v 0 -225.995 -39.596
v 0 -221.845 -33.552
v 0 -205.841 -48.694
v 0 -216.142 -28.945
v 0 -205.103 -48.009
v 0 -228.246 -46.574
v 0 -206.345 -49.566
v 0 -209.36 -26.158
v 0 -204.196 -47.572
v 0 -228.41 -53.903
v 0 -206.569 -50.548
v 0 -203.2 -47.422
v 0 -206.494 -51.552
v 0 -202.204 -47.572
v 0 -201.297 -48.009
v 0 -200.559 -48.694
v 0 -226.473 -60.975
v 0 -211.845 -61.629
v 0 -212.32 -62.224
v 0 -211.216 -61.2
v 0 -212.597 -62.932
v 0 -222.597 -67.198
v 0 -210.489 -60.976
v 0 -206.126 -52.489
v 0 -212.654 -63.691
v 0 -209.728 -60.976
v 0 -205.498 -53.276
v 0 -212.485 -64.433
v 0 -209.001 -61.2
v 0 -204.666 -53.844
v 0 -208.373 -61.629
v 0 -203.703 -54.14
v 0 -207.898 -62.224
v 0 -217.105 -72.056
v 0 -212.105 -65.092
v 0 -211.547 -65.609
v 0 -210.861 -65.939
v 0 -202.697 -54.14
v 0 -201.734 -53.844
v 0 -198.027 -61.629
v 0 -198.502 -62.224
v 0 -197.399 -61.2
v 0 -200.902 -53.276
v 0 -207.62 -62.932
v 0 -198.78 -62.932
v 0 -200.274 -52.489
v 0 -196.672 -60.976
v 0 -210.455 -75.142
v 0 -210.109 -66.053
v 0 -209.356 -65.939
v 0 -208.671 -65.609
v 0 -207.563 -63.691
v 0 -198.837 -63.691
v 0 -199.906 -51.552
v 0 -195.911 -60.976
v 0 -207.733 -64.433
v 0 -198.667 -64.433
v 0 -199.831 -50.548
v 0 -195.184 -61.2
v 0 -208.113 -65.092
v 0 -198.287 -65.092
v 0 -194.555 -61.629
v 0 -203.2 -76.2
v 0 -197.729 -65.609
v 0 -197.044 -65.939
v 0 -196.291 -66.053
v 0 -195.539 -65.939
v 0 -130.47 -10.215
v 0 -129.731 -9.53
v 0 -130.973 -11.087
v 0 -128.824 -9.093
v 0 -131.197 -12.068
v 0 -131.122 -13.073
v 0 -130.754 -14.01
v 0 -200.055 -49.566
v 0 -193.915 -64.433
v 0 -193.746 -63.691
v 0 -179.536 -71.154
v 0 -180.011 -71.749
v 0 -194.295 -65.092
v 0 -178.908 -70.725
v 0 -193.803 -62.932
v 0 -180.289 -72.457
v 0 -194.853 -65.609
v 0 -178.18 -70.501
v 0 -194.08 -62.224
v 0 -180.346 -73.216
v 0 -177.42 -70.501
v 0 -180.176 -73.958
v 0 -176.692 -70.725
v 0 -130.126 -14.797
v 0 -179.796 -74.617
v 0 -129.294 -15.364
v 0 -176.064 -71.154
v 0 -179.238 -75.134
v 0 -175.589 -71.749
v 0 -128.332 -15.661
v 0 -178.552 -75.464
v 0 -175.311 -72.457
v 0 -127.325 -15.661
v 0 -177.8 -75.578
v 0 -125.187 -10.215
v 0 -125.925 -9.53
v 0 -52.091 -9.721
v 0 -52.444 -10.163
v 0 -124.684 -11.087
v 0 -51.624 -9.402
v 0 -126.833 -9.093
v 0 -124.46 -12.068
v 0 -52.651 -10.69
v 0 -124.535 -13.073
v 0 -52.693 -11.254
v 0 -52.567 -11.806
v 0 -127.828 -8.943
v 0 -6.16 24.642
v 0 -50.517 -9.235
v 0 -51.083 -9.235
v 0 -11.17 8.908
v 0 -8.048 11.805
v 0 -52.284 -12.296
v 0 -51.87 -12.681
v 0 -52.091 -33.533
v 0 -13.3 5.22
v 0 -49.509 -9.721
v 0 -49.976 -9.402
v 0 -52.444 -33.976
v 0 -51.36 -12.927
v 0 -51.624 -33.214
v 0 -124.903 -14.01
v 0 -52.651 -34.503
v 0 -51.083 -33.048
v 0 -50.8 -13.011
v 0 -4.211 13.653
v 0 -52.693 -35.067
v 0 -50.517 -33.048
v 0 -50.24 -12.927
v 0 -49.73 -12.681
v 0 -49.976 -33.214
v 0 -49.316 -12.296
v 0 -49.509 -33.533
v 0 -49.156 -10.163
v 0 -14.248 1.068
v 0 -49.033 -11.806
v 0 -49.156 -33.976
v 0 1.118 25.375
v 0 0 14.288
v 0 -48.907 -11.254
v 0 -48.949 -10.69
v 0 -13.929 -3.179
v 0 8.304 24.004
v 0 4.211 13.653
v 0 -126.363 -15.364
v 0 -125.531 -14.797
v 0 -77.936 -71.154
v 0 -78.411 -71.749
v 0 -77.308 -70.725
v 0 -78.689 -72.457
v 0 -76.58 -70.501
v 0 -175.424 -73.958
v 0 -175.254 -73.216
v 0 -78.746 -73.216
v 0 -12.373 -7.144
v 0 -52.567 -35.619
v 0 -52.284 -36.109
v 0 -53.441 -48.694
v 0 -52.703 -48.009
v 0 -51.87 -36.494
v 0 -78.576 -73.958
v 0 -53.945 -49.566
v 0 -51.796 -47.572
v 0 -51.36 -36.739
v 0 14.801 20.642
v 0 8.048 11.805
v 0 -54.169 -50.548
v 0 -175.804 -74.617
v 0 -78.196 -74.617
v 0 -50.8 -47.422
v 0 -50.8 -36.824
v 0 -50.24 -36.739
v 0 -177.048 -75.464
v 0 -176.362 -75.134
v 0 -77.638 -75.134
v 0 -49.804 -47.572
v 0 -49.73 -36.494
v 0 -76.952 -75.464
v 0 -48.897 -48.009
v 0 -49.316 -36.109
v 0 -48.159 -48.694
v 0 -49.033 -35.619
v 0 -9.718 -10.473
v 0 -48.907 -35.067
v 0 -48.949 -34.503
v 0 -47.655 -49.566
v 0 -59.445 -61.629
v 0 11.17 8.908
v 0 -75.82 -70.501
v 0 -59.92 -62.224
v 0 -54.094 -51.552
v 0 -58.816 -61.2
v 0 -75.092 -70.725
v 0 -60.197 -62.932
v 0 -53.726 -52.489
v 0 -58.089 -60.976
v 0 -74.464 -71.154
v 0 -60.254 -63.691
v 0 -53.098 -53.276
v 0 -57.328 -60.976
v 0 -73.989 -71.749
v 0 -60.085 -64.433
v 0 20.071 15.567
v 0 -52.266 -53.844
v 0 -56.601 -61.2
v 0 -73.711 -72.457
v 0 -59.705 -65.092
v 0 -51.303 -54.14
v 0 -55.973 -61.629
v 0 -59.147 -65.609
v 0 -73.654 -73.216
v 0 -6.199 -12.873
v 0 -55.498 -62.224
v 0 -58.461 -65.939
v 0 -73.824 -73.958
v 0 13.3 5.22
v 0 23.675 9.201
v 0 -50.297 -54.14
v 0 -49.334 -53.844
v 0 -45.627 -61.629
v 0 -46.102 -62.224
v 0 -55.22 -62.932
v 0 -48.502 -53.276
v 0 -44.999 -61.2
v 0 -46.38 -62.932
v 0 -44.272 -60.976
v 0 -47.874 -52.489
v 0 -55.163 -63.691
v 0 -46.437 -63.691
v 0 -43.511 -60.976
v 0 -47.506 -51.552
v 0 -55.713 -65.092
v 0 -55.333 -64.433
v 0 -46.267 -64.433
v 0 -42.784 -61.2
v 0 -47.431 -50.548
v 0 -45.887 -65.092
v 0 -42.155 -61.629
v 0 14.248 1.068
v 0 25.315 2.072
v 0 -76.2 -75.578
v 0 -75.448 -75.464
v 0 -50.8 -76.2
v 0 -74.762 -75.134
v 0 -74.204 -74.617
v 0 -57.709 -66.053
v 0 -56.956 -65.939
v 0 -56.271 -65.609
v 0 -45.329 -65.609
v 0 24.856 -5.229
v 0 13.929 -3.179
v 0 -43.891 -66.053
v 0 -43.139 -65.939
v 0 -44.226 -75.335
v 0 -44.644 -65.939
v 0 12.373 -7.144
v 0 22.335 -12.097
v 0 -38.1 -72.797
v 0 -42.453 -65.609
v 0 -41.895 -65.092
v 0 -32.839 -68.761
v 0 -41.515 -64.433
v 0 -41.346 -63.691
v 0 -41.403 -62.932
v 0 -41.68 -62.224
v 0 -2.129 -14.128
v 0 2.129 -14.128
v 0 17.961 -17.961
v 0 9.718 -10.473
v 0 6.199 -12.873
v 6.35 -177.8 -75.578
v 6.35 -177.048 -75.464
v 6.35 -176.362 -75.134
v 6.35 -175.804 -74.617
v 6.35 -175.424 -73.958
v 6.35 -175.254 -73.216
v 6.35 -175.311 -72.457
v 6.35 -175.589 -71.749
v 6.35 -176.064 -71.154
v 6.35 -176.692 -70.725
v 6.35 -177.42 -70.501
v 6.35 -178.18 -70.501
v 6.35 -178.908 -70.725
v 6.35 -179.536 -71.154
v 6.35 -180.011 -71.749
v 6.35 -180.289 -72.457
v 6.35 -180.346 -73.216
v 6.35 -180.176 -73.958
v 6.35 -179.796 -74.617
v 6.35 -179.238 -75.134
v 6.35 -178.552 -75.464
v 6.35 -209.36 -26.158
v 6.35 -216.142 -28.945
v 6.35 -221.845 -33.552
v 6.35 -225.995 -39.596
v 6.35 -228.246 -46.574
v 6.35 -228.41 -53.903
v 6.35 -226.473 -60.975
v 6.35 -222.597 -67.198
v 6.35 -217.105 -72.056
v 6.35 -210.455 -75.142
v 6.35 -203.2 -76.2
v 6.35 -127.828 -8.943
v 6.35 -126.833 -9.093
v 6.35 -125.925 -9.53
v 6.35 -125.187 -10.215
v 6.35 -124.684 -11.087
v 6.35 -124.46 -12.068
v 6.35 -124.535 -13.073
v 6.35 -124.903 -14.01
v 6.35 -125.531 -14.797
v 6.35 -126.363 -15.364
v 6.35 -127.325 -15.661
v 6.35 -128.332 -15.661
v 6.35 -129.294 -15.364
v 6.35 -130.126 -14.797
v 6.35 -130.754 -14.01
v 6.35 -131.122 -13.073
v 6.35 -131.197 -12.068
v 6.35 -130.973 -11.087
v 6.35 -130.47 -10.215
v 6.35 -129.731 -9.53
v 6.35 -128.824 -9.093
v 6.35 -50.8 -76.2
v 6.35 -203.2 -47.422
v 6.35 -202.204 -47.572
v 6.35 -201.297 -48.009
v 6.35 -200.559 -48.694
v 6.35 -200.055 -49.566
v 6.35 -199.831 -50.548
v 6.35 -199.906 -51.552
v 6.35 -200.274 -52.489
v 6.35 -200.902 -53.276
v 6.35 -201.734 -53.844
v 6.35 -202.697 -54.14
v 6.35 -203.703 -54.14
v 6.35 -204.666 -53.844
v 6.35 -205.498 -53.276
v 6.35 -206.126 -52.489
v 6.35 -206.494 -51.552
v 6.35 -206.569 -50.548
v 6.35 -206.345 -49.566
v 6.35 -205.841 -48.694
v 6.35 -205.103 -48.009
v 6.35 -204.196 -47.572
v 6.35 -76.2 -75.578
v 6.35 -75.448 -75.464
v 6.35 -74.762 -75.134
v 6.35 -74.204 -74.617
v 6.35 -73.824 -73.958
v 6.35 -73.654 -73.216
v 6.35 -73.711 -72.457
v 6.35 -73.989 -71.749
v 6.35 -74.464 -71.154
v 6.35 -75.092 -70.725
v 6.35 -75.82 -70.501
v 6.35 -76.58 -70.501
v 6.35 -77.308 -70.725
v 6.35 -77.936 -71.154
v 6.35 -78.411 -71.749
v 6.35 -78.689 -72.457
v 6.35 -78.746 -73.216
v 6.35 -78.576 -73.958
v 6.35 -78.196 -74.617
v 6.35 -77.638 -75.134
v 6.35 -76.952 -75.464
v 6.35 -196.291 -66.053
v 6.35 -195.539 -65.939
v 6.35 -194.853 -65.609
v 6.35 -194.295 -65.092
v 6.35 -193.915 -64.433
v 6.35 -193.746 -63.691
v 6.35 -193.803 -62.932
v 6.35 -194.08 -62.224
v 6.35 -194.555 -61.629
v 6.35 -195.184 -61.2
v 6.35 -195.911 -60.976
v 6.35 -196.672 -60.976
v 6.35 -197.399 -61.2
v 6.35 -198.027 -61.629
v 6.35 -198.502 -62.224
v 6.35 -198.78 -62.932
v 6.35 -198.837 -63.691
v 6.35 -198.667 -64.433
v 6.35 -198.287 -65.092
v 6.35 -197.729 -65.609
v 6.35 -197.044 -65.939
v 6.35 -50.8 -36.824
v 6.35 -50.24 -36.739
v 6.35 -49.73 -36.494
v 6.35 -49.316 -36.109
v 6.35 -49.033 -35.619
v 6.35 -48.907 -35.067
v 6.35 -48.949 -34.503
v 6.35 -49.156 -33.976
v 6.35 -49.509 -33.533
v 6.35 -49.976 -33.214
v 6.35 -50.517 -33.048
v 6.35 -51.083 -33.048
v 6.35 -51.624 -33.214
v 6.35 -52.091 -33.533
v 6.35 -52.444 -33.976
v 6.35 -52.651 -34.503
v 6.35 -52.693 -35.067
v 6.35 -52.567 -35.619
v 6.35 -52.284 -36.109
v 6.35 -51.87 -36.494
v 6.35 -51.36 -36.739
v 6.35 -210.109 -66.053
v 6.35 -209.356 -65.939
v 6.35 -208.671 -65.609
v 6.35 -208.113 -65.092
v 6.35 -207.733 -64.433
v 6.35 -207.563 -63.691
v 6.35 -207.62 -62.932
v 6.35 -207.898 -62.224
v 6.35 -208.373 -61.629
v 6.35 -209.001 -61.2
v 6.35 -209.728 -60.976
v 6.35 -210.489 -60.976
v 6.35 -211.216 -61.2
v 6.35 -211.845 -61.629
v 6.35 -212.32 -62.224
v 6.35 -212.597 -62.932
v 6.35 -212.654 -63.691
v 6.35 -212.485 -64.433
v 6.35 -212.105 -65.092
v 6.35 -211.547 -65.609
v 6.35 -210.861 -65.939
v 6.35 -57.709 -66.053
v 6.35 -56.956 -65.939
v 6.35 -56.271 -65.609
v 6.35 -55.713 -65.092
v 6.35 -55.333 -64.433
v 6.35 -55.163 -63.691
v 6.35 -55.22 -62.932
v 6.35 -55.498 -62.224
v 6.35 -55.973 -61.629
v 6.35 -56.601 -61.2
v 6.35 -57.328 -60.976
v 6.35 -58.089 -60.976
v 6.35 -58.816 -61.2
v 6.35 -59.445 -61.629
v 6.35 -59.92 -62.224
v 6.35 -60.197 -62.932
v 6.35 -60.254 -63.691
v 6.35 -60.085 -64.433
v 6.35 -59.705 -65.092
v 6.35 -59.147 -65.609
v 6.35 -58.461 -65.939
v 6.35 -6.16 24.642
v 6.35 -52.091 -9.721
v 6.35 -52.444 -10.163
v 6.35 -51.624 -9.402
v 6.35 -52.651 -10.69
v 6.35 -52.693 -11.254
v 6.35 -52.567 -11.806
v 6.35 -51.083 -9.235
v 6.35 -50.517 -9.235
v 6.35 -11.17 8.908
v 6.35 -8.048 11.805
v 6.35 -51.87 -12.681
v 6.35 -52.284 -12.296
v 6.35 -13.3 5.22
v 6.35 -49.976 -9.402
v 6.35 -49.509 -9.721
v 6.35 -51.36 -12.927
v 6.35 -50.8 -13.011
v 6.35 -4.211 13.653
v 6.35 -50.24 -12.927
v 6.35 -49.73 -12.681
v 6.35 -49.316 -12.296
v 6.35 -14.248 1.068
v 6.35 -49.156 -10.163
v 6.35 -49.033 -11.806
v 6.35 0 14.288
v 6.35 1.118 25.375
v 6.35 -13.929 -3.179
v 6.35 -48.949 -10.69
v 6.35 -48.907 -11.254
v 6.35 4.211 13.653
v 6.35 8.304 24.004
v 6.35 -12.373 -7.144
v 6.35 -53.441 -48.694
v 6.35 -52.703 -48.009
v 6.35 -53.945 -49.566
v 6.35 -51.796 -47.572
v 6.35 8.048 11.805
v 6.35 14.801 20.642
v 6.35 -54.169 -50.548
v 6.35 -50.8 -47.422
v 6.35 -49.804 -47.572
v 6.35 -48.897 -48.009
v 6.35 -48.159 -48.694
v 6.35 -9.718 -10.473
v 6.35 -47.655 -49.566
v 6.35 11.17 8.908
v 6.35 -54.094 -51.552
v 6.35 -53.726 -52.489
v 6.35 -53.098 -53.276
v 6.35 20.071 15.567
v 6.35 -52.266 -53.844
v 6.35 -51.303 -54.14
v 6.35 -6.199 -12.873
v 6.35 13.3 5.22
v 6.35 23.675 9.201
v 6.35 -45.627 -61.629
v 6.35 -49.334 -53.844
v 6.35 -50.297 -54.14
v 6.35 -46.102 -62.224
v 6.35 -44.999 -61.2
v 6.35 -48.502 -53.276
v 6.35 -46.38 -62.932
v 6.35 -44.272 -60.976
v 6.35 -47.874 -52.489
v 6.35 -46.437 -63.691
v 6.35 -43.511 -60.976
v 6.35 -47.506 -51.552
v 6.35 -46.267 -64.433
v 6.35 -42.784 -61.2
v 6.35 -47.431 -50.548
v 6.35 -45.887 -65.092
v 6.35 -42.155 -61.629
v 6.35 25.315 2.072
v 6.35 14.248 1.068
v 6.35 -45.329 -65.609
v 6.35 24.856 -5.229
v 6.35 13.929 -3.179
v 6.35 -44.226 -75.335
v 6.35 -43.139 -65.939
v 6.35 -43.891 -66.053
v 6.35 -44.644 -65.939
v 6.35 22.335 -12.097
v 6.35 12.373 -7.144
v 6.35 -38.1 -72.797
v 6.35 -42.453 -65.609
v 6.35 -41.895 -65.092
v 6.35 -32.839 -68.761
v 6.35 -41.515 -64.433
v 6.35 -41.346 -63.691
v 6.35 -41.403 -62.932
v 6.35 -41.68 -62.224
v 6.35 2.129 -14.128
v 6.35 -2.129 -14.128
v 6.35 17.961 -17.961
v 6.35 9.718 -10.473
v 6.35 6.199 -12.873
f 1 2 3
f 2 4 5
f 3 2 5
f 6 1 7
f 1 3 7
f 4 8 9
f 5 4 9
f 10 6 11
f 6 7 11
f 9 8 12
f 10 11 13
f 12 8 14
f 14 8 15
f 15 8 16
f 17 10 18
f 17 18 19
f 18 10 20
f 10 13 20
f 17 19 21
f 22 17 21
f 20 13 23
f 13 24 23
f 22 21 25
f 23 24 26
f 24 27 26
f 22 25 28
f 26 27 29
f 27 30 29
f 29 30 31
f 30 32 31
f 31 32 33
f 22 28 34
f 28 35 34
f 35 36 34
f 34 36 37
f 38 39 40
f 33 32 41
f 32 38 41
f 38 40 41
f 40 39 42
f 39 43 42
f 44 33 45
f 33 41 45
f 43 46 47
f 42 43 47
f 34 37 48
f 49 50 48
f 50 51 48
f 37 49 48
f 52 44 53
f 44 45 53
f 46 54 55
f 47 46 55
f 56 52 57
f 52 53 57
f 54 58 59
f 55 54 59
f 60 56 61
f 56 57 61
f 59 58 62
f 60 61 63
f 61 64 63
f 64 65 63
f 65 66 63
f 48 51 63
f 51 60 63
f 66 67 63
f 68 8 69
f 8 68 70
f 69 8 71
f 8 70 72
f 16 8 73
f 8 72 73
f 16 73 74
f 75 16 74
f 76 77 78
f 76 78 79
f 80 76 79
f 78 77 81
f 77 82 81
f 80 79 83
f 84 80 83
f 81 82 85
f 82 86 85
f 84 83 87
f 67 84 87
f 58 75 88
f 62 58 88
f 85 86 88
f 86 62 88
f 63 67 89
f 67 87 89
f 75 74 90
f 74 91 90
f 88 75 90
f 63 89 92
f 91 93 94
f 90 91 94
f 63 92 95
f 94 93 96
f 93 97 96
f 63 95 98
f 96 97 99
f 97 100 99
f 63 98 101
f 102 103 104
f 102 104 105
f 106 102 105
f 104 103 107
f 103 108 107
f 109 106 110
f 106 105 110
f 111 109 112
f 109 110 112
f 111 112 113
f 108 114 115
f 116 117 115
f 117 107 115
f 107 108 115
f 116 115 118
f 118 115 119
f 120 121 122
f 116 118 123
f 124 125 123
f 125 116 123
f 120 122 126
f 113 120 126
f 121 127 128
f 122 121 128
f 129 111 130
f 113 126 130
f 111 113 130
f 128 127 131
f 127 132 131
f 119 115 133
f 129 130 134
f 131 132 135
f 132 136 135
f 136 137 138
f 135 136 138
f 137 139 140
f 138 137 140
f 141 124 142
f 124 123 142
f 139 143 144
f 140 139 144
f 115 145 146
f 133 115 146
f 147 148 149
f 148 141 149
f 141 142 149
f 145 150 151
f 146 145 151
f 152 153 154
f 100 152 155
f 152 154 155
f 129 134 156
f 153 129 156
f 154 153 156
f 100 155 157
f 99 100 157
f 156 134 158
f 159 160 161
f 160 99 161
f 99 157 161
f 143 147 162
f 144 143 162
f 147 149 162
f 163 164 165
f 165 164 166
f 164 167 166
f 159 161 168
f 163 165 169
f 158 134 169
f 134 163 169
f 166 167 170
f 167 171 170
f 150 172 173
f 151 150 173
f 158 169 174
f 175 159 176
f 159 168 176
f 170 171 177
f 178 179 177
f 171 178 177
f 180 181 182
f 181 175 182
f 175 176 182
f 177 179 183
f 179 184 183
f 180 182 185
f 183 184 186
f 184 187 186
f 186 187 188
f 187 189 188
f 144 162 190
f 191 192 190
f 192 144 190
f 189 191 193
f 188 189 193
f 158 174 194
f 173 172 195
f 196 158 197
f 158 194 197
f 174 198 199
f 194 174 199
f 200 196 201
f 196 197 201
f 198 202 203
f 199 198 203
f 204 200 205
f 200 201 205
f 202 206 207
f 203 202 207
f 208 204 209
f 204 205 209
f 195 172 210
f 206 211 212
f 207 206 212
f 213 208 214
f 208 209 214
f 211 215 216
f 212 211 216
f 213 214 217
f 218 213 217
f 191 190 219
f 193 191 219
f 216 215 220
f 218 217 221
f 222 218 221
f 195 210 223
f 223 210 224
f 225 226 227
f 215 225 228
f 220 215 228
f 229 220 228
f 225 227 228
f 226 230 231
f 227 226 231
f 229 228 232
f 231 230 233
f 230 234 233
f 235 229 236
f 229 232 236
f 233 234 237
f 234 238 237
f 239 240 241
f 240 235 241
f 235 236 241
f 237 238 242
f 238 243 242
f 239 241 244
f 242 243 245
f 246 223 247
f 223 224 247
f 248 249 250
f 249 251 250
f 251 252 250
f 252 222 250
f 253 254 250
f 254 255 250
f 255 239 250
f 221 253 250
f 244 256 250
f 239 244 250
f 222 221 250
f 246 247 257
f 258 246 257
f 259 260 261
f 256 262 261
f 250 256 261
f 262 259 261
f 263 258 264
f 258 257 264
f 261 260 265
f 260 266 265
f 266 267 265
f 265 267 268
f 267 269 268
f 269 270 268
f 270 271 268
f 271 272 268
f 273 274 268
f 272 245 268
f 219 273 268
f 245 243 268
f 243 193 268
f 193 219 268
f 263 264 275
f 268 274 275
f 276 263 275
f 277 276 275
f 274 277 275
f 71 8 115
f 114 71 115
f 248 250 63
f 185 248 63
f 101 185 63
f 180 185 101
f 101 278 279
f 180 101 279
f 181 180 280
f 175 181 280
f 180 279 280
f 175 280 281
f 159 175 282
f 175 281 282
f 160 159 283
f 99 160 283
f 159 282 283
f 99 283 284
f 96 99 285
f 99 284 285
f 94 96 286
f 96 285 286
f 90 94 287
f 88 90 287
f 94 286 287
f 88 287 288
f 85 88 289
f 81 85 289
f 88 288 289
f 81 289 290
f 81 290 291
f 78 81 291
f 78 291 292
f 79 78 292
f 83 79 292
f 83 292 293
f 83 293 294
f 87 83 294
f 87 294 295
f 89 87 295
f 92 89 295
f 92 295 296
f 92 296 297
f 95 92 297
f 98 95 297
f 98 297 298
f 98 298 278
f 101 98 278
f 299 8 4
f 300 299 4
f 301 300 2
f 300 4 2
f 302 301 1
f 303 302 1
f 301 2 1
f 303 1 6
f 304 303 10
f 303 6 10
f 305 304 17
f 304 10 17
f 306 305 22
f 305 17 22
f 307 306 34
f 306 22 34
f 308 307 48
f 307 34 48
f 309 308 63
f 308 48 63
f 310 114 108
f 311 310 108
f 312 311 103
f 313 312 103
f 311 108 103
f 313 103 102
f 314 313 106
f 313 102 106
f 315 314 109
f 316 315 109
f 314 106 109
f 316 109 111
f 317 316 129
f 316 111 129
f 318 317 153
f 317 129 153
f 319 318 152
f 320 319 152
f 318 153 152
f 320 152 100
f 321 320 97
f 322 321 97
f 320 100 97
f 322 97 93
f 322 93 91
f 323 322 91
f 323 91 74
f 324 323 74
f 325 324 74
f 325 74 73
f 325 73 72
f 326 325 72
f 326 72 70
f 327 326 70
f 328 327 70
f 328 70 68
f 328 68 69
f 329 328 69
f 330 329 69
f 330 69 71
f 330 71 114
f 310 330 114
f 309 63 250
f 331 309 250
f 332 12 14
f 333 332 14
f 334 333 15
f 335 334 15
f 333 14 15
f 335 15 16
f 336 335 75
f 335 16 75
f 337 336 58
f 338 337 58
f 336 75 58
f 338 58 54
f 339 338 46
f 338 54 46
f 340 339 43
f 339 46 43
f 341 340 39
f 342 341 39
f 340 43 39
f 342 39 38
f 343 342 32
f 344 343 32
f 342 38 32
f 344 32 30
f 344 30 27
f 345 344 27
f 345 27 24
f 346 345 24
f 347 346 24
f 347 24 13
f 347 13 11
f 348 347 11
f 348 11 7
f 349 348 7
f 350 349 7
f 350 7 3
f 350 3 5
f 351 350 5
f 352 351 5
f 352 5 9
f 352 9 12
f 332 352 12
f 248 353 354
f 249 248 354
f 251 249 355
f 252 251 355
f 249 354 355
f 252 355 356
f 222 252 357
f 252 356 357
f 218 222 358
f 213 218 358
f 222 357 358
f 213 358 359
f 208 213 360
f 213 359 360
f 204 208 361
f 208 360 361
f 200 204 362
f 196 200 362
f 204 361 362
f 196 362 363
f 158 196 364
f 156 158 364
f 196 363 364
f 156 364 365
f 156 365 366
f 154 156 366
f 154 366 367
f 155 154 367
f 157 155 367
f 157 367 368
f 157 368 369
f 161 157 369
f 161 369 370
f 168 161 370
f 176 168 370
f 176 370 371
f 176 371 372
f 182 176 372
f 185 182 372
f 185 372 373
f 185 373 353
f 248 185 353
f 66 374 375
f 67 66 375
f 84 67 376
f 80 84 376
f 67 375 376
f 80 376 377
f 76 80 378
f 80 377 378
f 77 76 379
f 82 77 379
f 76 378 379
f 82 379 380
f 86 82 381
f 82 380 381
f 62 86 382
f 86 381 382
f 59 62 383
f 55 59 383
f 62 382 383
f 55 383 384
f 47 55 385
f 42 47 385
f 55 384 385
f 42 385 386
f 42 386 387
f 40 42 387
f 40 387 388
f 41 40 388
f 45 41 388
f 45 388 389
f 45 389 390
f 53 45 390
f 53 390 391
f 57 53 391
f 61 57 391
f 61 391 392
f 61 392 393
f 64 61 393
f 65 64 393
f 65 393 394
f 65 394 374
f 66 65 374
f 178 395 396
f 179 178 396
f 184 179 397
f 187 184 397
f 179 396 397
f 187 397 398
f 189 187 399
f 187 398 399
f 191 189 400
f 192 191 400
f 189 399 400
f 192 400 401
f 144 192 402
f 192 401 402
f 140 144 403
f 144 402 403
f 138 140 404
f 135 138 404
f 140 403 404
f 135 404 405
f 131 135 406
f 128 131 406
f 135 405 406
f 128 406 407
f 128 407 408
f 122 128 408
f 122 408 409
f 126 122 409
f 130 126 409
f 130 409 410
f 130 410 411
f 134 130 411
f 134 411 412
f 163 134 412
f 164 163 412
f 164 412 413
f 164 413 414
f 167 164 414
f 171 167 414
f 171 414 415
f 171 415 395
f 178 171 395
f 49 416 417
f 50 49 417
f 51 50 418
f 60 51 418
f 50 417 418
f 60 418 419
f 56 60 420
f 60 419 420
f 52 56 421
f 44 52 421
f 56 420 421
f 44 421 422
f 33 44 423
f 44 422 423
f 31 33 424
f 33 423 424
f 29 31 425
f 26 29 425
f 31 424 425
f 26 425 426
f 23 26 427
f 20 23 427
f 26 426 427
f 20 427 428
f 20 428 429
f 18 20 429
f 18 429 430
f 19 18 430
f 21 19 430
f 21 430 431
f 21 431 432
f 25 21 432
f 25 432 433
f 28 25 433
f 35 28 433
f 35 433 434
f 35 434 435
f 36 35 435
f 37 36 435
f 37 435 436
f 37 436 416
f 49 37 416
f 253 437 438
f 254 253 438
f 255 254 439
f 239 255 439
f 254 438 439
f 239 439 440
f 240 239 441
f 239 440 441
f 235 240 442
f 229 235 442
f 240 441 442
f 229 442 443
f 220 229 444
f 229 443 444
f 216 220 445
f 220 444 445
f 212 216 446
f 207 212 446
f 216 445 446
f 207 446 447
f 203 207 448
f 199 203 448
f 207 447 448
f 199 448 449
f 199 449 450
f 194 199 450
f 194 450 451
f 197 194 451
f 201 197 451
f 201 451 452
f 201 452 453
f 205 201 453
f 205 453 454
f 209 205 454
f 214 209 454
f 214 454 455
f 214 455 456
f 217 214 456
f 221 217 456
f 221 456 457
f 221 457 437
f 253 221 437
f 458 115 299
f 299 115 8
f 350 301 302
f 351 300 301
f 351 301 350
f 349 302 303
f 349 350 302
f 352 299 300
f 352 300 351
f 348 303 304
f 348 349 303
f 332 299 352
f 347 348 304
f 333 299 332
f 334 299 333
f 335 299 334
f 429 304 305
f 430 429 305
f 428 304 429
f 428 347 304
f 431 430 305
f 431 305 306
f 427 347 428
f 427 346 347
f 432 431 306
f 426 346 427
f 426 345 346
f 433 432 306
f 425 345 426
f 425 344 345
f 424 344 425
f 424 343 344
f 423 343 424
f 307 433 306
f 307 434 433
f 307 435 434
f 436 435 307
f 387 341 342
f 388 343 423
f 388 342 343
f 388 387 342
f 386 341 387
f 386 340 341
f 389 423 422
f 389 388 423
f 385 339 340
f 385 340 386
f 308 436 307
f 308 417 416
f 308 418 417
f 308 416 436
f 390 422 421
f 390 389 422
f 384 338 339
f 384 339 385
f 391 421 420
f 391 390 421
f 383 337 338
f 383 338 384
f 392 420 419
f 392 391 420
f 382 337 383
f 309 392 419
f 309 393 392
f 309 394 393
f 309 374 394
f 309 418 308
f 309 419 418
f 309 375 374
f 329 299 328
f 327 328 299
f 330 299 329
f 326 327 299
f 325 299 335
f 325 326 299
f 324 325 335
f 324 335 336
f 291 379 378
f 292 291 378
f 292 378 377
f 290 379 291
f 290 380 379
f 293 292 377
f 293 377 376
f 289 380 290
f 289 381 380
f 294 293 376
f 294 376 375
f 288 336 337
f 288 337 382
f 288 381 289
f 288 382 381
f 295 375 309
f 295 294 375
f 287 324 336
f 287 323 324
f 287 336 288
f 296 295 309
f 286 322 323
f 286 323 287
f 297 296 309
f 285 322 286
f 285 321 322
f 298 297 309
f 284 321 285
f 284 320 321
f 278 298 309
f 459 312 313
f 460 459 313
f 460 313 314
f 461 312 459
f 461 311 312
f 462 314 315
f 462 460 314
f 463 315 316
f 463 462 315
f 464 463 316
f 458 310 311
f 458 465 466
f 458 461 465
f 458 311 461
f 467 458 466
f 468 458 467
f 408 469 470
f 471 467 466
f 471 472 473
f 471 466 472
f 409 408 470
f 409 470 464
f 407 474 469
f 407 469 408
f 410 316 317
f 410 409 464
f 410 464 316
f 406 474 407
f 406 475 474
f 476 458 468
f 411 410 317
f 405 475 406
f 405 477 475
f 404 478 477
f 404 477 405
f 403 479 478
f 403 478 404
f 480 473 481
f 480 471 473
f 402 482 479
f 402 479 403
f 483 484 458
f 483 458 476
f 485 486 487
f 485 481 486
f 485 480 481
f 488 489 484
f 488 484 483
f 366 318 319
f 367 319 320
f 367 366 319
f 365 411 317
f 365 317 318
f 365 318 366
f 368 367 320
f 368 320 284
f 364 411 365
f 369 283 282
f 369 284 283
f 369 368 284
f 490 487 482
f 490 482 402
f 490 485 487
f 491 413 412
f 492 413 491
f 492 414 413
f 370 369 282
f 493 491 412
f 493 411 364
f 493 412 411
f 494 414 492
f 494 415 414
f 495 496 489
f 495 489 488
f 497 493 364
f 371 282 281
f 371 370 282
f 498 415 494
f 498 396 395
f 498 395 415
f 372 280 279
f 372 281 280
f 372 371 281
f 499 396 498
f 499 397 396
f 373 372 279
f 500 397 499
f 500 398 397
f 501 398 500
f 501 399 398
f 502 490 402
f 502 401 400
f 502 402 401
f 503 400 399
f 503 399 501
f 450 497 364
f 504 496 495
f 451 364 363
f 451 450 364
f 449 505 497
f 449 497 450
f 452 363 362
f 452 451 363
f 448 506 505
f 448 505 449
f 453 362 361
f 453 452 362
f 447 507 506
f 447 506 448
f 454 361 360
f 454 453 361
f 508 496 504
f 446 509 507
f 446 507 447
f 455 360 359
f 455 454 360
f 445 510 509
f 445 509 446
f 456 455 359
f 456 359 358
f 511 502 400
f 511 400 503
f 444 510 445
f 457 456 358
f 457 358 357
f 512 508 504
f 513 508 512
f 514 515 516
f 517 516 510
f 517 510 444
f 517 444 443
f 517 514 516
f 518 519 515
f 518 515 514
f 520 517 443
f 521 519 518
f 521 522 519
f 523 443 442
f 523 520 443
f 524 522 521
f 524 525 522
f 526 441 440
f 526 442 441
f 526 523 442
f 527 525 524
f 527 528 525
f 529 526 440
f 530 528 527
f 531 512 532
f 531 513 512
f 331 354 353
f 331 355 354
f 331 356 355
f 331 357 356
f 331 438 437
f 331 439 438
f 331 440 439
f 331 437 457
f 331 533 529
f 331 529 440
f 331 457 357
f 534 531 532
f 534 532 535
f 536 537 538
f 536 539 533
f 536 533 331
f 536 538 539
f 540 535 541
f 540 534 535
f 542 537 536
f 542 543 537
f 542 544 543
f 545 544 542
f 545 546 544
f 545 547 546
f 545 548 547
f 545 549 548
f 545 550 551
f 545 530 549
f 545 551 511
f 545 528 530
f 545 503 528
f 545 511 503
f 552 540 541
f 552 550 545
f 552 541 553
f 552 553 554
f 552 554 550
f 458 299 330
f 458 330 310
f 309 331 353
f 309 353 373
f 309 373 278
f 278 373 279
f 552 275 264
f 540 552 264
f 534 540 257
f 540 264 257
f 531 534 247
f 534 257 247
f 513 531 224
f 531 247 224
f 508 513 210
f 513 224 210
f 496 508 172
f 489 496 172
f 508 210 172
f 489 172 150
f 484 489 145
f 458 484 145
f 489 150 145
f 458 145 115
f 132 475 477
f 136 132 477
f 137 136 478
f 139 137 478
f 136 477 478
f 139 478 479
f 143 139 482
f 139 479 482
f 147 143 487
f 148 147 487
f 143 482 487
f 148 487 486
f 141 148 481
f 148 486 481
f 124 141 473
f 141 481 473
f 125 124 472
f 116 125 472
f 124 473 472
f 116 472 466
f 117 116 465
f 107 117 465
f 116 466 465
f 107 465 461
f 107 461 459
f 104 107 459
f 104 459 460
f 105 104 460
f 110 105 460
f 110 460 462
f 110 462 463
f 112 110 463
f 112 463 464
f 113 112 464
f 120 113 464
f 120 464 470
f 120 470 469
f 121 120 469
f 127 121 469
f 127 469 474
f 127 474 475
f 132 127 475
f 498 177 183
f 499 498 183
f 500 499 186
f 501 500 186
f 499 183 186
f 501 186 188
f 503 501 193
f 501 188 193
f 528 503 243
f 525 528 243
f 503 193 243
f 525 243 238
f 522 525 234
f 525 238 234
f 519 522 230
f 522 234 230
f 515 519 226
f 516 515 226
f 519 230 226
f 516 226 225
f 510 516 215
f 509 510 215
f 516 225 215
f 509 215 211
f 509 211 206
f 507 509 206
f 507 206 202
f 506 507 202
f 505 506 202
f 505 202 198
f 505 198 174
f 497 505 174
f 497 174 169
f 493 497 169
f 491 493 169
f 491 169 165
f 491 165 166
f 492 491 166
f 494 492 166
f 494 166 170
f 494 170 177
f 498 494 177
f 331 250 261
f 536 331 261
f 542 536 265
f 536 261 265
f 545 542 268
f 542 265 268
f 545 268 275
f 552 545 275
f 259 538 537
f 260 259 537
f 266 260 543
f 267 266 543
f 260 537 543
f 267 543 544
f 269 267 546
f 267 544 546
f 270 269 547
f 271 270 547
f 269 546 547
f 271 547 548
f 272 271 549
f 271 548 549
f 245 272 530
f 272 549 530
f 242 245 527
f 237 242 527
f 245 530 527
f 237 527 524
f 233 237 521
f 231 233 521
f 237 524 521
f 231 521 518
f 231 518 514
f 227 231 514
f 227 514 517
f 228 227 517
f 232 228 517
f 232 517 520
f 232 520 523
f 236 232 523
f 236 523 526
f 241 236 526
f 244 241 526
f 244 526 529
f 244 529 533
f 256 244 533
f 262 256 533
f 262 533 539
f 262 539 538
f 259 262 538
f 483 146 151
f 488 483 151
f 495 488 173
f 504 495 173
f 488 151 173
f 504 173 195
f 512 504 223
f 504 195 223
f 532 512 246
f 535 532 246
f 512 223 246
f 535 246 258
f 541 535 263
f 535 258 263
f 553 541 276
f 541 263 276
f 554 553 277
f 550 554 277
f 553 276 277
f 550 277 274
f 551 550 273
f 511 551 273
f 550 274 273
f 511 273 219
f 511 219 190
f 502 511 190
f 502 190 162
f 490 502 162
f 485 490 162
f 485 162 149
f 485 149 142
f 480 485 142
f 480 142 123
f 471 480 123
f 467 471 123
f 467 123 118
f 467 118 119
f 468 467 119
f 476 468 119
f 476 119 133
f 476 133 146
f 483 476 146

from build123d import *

# Parameters (mm, degrees)
BOSS_EXTRUDE1_DEPTH     = 6.35
F_1_1_DIAMETER_HOLE1_D  = 28.575
F_1_4_CLEARANCE_HOLE1_D = 6.7564
F_1_4_20_TAPPED_HOLE1_D = 5.1054
F_10_24_TAPPED_HOLE1_D  = 3.7973
F_10_CLEARANCE_HOLE1_D  = 5.1054


with BuildPart() as part:
    # Sketch2 → Boss-Extrude1 (new body)
    with BuildSketch(Plane(origin=(0, 0, 0), x_dir=(0, 0, -1), z_dir=(1, 0, 0))):
        with BuildLine():
            Line((68.760512242, -32.839487758), (17.960512242, 17.960512242))
            ThreePointArc((17.960512242, 17.960512242), (-12.514549901, 22.103077632), (-24.641619504, -6.160404876))
            Line((-24.641619504, -6.160404876), (26.158380496, -209.360404876))
            ThreePointArc((26.158380496, -209.360404876), (53.903454898, -228.40969194), (76.2, -203.2))
            Line((76.2, -203.2), (76.2, -50.8))
            ThreePointArc((76.2, -50.8), (74.266540126, -41.079840818), (68.760512242, -32.839487758))
        make_face()
    extrude(amount=BOSS_EXTRUDE1_DEPTH)

    # 1 (1) Diameter Hole1 (through all)
    with Locations(Plane(origin=(6.35, 0, 0), x_dir=(0, 0, -1), z_dir=(1, 0, 0))):
        with Locations((0, 0)):
            Hole(F_1_1_DIAMETER_HOLE1_D / 2)

    # 1/4 Clearance Hole1 (through all)
    with Locations(Plane(origin=(6.35, 0, 0), x_dir=(0, 0, -1), z_dir=(1, 0, 0))):
        with Locations((50.8, -50.8), (50.8, -203.2), (12.320809752, -127.828401175)):
            Hole(F_1_4_CLEARANCE_HOLE1_D / 2)

    # 1/4-20 Tapped Hole1 (through all)
    with Locations(Plane.ZY):
        with Locations((-63.5, -57.7088), (-63.5, -43.8912), (-63.5, -196.2912), (-63.5, -210.1088)):
            Hole(F_1_4_20_TAPPED_HOLE1_D / 2)

    # #10-24 Tapped Hole1 (through all)
    with Locations(Plane.ZY):
        with Locations((-34.925, -50.8), (-11.1125, -50.8)):
            Hole(F_10_24_TAPPED_HOLE1_D / 2)

    # #10 Clearance Hole1 (through all)
    with Locations(Plane.ZY):
        with Locations((-73.025, -76.2), (-73.025, -177.8)):
            Hole(F_10_CLEARANCE_HOLE1_D / 2)


solid = part.part
